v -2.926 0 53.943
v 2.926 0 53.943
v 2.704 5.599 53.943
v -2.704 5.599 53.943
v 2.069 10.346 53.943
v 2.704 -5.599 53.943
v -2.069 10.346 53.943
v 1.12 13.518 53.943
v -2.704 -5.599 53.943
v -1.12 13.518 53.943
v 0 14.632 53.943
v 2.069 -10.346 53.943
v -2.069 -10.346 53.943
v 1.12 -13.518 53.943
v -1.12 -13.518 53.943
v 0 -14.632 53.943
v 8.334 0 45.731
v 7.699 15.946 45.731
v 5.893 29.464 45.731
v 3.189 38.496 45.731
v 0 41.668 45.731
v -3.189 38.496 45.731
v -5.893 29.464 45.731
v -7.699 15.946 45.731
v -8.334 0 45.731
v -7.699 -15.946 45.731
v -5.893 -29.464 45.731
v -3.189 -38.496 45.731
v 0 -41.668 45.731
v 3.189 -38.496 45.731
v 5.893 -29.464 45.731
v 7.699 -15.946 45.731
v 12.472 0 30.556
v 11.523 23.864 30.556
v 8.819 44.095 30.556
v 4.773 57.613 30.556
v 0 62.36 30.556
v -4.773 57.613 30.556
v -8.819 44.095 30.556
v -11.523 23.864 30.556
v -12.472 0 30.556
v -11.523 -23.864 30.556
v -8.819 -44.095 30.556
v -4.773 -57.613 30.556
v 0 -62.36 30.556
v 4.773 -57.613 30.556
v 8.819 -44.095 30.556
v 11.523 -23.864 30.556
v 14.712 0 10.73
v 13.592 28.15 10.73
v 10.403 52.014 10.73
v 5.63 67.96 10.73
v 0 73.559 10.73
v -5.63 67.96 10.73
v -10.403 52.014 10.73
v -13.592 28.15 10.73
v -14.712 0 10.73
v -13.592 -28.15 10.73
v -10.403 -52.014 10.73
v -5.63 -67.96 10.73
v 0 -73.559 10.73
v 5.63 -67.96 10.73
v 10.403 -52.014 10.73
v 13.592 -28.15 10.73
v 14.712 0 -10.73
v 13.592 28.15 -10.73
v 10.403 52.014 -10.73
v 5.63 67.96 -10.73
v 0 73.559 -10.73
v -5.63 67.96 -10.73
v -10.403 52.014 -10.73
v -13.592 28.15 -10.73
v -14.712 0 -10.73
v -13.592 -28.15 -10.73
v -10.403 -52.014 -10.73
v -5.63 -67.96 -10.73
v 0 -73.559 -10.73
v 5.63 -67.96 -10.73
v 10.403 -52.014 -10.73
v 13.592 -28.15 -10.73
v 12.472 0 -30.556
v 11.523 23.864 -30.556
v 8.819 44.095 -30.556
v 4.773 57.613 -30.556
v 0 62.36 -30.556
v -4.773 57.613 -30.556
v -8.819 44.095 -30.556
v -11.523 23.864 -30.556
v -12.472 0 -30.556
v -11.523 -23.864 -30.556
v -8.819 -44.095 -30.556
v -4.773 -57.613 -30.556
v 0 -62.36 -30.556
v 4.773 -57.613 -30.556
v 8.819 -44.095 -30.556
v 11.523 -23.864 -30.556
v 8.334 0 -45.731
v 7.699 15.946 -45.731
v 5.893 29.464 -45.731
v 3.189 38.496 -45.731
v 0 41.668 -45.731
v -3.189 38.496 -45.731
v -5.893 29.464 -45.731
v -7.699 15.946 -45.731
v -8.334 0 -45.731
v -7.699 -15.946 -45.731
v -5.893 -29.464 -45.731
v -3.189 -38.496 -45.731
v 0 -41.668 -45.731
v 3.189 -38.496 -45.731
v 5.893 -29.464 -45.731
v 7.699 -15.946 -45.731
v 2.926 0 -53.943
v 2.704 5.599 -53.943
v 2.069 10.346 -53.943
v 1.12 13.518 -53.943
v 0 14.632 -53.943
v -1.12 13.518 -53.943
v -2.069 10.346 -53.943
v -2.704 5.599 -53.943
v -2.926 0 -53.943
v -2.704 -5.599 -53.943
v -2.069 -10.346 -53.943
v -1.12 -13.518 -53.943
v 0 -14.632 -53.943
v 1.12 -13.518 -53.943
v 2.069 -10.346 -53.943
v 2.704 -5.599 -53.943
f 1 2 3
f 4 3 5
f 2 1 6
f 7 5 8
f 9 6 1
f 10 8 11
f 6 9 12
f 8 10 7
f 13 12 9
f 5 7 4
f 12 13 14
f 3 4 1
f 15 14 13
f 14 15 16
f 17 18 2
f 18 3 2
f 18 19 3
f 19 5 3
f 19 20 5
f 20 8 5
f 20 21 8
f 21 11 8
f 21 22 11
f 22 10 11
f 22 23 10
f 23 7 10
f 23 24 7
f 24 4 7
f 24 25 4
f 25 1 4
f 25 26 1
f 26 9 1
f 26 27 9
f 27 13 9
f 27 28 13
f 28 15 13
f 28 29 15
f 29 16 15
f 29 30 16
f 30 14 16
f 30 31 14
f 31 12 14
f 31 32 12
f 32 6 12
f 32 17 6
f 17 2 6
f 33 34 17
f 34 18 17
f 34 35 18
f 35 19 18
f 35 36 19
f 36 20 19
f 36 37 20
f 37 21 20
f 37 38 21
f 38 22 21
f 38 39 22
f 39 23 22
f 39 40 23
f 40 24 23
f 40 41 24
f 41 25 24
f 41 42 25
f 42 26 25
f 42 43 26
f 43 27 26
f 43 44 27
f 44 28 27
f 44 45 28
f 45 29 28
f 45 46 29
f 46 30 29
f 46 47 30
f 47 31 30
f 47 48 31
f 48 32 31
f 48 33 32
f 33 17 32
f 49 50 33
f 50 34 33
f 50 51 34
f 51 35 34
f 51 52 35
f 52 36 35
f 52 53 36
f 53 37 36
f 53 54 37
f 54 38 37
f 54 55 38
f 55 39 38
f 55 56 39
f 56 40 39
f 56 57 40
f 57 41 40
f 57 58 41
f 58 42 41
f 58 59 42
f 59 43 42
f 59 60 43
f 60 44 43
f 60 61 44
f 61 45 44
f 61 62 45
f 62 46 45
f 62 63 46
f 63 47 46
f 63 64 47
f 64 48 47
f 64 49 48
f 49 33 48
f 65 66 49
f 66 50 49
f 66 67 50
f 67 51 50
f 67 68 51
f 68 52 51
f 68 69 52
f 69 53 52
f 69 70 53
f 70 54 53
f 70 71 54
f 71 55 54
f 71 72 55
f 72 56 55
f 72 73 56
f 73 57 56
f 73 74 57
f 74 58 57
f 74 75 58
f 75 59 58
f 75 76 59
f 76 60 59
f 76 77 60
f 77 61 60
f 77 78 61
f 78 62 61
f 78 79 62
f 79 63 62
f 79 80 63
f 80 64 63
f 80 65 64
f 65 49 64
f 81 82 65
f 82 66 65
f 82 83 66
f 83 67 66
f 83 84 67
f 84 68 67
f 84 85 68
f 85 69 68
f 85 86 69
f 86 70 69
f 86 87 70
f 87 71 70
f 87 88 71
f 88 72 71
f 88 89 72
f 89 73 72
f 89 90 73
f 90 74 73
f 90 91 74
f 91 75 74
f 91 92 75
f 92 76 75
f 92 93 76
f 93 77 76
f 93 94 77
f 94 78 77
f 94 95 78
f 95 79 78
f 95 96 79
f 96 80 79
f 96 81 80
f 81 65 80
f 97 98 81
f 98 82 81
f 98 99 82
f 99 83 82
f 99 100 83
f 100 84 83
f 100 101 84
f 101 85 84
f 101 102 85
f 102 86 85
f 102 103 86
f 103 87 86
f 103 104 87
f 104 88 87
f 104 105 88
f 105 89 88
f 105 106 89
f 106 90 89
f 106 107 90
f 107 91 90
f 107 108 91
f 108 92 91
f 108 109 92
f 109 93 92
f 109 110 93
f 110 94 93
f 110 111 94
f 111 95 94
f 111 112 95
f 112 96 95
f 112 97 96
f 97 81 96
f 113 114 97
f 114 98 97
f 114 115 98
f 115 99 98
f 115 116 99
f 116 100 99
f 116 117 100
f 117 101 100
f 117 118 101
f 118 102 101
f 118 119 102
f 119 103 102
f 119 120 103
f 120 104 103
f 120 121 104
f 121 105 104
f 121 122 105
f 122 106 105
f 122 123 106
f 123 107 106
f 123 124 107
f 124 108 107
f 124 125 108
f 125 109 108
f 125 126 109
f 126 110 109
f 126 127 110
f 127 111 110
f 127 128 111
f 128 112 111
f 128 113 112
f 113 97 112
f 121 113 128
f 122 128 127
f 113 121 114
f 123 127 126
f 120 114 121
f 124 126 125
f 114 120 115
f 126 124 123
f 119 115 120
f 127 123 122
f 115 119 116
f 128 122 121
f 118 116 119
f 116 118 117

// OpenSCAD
// Generated by SolidPython 1.0.1 on 2020-07-29 00:46:45


scale(v = [3, 15, 11]) {
	sphere(r = 5);
}
/***********************************************
*********      SolidPython code:      **********
************************************************
 
# import packages: SolidPython
from solid import *
from solid.utils import *
from itertools import chain, combinations, permutations


class Resize:

    def __init__(self, scad_file):
        self.scad_file = scad_file
        #self.scad_file = import_scad(scad_file)
        # cone/cylinder param:
        self.r1 = 0
        self.r2 = 0
        self.h = 0
        # rectangular prism param:
        self.w = 0
        self.l = 0
        # ellipse param:
        self.r = 0

    # import OpenScad code (file name corresponds to shape)


    # classify shape + parameters
    def assign(self, param1, param2, param3):
        if self.scad_file == 'cone.scad':
            self.r1 = param1
            self.r2 = param2
            self.h = param3
        elif self.scad_file == 'cylinder.scad':
            self.r1 = param1
            self.r2 = param2
            self.h = param3
        elif self.scad_file == 'rectangularPrism.scad':
            self.h = param1
            self.l = param2
            self.w = param3
        else:
            self.r = param1
            self.h = param2

    # resize parameters
    def iterate(self):
        x = range(3, 20, 2)
        i = 1
        if self.scad_file == 'cone.scad':
            tempList = list(permutations(x, 2))
            for temp in tempList:
                param1 = temp[0]
                param2 = temp[1]
                filepath = 'produced_scad_files/' + 'cone' + str(param1) + '_' + str(param2) + '_' + '.scad'
                scad_render_to_file(cylinder(h=param1, r1=param2, r2=0), filepath)

        elif self.scad_file == 'cylinder.scad':
            tempList = list(permutations(x, 3))
            for temp in tempList:
                param1 = temp[0]
                param2 = temp[1]
                filepath = 'produced_scad_files/' + 'cylinder' + str(param1) + '_' + str(param2) + '_' + '.scad'
                scad_render_to_file(cylinder(h=param1, r1=param2, r2=param2), filepath)

        elif self.scad_file == 'rectangularPrism.scad':
            tempList = list(permutations(x, 3))
            for temp in tempList:
                param1 = temp[0]
                param2 = temp[1]
                param3 = temp[2]
                filepath = 'produced_scad_files/' + 'rectangularPrism' + str(param1) + '_' + str(param2) + '_' + str(
                    param3) + '.scad'
                scad_render_to_file(cube(size=(param1, param2, param3)), filepath)

        elif self.scad_file == 'ellipse.scad':
            tempList = list(permutations(x, 4))
            for temp in tempList:
                param1 = temp[0]
                param2 = temp[1]
                param3 = temp[2]
                param4 = temp[3]
                filepath = 'produced_scad_files/' + 'ellipse' + str(param1) + '_' + str(param2) + '_' + str(param3) + '_' + str(param4) + '.scad'
                scad_render_to_file(scale([param1, param2, param3])(sphere(r=param4)), filepath)

    def render_to_scadfile(self):
        scad_render_to_file(scad, 'example.scad') 
 
************************************************/
